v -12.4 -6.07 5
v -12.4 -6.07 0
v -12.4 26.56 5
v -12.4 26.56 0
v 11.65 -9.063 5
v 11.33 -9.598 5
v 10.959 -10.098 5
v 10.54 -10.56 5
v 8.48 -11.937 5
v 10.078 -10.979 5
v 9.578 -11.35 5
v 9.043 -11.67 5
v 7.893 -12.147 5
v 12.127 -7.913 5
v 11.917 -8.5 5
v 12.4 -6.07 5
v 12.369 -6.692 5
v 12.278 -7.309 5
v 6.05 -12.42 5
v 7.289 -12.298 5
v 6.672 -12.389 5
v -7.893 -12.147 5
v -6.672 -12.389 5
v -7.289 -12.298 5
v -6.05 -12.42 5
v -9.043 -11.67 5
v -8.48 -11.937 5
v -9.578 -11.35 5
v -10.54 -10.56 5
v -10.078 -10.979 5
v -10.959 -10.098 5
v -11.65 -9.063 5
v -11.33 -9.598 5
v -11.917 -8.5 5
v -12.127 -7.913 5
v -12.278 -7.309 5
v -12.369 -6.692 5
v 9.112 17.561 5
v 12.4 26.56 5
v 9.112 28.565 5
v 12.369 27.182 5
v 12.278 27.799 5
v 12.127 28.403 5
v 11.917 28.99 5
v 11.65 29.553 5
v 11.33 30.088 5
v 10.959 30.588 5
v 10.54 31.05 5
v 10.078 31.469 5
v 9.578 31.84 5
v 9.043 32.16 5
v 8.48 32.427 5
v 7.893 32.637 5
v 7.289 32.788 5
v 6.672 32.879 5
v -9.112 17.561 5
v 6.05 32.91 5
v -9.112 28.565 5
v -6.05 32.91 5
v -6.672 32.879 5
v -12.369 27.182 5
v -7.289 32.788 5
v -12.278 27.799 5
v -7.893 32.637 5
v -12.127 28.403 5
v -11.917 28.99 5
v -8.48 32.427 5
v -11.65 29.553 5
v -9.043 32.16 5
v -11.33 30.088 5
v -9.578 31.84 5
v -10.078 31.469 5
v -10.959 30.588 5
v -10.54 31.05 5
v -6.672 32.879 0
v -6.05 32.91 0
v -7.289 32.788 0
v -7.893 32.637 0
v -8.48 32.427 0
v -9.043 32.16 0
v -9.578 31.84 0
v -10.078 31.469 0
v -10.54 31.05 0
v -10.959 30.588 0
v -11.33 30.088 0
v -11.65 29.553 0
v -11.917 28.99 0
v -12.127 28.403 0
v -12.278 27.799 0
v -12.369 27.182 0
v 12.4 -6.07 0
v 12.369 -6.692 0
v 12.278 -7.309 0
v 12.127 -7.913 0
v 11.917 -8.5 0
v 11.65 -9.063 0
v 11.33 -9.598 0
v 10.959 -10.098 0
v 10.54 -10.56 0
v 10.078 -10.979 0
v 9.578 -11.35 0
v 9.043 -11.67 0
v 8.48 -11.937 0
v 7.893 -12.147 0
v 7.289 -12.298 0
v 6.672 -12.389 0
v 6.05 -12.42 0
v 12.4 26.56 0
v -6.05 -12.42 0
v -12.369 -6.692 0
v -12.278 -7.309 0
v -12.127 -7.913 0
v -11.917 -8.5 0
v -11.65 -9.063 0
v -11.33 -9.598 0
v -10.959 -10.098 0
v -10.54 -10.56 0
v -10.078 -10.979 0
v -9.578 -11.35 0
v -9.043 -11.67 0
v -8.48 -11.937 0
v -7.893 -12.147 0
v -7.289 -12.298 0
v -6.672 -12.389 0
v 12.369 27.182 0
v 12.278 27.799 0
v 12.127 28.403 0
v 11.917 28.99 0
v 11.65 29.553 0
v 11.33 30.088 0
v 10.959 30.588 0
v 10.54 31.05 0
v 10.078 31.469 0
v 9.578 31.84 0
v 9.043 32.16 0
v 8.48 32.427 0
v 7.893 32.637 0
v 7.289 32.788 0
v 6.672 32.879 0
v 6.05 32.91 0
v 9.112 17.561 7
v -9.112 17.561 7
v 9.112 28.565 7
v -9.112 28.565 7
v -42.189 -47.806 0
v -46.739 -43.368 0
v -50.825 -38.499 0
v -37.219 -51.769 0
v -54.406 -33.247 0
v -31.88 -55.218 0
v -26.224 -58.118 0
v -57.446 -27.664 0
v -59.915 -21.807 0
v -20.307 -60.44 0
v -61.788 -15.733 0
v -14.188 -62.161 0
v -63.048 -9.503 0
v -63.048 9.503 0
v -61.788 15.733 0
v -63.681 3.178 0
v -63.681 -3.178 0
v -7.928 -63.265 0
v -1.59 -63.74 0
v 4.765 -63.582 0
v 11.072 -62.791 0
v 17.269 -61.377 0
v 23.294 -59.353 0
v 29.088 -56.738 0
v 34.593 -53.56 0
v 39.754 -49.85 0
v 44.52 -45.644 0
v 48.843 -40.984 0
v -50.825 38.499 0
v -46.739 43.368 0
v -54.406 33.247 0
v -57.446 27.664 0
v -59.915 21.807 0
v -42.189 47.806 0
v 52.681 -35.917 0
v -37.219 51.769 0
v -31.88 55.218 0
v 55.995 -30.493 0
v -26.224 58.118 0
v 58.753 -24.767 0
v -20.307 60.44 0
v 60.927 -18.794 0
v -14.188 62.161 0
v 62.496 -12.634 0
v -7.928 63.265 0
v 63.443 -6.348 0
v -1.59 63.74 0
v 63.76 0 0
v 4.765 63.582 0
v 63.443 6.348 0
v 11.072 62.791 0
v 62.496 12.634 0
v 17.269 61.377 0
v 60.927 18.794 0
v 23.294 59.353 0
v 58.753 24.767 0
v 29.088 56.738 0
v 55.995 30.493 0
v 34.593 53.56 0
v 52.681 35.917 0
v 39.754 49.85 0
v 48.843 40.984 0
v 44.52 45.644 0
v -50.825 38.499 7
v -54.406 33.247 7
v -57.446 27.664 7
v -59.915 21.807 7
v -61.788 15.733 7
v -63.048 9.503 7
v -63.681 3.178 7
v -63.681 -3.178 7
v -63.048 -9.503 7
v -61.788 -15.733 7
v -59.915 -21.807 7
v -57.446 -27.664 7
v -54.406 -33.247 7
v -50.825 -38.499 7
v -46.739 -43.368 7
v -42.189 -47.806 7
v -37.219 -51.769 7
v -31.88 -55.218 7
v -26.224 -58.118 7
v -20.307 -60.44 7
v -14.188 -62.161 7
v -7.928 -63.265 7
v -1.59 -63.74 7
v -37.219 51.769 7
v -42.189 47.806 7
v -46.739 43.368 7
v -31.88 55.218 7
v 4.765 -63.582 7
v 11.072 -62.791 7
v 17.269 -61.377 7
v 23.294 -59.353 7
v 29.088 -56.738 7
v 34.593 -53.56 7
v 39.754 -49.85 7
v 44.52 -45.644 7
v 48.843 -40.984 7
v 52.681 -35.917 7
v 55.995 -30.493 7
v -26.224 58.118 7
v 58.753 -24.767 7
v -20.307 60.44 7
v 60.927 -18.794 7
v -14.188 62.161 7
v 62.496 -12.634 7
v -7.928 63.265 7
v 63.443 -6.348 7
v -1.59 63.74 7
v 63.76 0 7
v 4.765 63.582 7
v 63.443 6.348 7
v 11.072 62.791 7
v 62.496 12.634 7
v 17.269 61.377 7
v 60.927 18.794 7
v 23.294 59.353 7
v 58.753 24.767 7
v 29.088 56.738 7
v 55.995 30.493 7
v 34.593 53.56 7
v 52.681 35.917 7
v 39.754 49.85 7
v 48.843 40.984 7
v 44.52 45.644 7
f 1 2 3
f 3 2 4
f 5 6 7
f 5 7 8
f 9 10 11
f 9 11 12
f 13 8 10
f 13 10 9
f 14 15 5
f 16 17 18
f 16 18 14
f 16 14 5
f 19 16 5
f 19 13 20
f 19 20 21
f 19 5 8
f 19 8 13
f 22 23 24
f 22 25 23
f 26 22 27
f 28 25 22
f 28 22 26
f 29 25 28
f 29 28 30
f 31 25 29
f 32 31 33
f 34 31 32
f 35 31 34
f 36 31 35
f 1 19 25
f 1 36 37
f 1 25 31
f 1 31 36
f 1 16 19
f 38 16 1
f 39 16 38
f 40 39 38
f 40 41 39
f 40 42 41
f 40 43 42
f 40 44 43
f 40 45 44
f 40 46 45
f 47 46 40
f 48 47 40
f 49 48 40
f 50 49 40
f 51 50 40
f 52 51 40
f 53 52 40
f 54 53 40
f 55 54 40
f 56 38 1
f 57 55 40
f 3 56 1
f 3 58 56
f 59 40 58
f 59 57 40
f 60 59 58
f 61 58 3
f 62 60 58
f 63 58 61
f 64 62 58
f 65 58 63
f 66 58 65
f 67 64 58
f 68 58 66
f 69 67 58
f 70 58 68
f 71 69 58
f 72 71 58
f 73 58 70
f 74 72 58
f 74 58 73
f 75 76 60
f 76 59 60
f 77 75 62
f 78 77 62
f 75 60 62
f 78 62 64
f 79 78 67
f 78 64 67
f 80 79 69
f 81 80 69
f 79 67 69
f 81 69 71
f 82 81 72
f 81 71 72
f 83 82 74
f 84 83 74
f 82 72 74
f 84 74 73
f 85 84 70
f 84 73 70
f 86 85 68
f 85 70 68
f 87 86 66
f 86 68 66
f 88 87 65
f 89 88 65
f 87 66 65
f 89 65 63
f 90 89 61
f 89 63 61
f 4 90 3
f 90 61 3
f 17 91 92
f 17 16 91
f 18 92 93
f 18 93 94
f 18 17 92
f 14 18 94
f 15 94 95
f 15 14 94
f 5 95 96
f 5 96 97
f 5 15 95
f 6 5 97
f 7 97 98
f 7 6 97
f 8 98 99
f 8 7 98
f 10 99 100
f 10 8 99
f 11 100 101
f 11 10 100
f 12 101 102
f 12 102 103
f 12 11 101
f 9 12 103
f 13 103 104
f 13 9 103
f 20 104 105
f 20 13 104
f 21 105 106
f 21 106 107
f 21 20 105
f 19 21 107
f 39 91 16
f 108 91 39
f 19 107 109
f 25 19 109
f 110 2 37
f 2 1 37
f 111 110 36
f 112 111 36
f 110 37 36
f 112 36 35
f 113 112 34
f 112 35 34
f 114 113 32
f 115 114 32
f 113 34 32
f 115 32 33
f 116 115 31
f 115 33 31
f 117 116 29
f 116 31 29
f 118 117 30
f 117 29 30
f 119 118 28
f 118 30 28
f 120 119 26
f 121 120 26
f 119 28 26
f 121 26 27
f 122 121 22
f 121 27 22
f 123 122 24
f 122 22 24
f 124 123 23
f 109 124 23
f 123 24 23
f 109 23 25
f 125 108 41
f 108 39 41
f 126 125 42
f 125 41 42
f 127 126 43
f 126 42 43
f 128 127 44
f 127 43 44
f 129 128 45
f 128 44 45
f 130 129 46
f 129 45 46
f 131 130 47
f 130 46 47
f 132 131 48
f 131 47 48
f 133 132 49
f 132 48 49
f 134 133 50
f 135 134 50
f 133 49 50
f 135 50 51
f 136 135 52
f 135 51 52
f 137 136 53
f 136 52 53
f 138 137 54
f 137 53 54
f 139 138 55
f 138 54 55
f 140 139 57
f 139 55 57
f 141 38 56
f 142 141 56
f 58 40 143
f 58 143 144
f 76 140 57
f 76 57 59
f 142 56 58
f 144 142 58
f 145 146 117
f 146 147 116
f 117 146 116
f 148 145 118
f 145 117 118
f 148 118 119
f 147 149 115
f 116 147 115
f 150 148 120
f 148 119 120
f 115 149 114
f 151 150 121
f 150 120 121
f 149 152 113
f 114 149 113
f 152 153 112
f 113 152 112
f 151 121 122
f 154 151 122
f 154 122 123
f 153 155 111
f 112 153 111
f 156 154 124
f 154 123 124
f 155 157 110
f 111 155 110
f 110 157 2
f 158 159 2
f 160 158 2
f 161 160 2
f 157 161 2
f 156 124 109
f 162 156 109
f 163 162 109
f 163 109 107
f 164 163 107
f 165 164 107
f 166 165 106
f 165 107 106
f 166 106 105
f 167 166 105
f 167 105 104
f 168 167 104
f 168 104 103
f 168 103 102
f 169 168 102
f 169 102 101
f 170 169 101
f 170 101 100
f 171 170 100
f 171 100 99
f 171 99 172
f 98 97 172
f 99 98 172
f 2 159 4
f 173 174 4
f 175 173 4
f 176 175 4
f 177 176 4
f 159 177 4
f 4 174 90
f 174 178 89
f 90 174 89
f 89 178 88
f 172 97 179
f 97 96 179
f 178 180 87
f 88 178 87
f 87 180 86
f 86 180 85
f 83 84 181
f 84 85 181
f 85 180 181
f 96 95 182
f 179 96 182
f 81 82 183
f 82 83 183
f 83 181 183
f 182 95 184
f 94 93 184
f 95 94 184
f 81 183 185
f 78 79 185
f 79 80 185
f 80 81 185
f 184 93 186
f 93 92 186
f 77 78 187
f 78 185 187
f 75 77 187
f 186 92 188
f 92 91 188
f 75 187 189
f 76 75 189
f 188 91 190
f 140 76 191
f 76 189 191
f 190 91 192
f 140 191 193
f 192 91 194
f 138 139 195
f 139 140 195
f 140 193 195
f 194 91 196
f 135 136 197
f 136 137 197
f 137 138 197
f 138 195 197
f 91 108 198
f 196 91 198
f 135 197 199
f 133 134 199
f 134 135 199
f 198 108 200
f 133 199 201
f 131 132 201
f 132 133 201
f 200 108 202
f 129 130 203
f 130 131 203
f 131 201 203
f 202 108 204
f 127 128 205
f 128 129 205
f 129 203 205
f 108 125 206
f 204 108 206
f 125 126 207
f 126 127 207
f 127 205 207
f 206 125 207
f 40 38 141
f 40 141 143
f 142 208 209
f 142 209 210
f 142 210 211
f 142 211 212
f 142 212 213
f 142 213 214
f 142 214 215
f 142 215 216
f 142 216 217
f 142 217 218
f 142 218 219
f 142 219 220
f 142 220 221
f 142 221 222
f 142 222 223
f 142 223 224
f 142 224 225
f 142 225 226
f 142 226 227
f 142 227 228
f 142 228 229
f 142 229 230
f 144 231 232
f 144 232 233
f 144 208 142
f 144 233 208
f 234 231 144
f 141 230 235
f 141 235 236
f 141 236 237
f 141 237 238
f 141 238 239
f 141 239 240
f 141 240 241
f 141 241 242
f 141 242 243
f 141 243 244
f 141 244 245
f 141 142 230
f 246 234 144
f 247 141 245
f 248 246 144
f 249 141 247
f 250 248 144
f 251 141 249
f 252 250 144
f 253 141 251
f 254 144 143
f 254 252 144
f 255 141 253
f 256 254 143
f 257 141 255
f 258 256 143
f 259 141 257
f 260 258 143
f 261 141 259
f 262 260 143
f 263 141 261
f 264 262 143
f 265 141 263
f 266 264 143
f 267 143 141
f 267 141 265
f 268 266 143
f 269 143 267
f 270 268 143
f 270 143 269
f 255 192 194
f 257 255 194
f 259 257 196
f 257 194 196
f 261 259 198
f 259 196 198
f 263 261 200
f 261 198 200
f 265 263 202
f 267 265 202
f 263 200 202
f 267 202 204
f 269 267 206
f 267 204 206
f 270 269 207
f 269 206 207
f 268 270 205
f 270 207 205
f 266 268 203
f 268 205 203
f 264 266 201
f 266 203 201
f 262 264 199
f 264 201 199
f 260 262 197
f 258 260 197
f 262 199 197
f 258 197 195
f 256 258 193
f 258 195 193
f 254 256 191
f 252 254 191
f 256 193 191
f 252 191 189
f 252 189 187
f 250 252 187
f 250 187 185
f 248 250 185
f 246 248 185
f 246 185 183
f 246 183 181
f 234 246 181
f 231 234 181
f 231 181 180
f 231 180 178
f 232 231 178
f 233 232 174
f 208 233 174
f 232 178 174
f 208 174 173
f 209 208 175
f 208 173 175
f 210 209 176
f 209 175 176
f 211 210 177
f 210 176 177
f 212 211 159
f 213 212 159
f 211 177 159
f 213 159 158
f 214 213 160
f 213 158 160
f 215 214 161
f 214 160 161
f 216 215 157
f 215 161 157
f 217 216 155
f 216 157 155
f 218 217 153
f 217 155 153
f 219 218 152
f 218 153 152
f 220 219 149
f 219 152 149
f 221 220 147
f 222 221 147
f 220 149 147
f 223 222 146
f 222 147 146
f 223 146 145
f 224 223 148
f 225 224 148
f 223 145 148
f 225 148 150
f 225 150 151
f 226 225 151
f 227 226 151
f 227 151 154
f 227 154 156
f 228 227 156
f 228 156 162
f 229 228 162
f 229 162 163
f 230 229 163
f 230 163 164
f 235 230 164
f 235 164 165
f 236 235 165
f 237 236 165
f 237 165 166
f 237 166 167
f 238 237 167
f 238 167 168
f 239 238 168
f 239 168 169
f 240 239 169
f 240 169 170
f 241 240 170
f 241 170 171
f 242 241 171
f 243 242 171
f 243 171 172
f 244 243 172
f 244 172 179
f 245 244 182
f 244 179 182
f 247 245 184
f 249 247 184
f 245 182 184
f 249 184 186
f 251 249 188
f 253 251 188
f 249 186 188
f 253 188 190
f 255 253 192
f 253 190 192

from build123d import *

# Parameters (mm, degrees)
SKETCH1_R           = 63.76
BOSS_EXTRUDE1_DEPTH = 7
SKETCH4_W           = 24.8
SKETCH4_H           = 45.33
CUT_EXTRUDE1_DEPTH  = 5
FILLET1_R           = 6.35
CUT_EXTRUDE2_REACH  = 92.309
SKETCH5_W           = 18.224025504
SKETCH5_H           = 11.004820717


with BuildPart() as part:
    # Sketch1 → Boss-Extrude1 (new body)
    with BuildSketch(Plane.XY):
        Circle(SKETCH1_R)
    extrude(amount=BOSS_EXTRUDE1_DEPTH)

    # Sketch4 → Cut-Extrude1 (cut)
    with BuildSketch(Plane(origin=(0, 0, 0), x_dir=(-1, 0, 0), z_dir=(0, 0, -1))):
        with Locations((0, 10.245)):
            Rectangle(SKETCH4_W, SKETCH4_H)
    extrude(amount=-CUT_EXTRUDE1_DEPTH, mode=Mode.SUBTRACT)

    # Fillet1
    fillet1_edges = [part.edges().sort_by_distance(p)[0] for p in [
        (12.4, -12.42, 2.5),
        (12.4, 32.91, 2.5),
        (-12.4, 32.91, 2.5),
        (-12.4, -12.42, 2.5),
    ]]
    fillet(fillet1_edges, radius=FILLET1_R)

    # Sketch5 → Cut-Extrude2 (cut, up to next)
    with BuildSketch(Plane(origin=(0, 0, 5), x_dir=(-1, 0, 0), z_dir=(0, 0, -1)), mode=Mode.PRIVATE) as cut_extrude2_sk1:
        with Locations((0, 23.06297221)):
            Rectangle(SKETCH5_W, SKETCH5_H)
    cut_extrude2_tool1 = extrude(cut_extrude2_sk1.sketch, amount=-CUT_EXTRUDE2_REACH, mode=Mode.PRIVATE) & part.part
    add(cut_extrude2_tool1.solids().sort_by_distance((0, 23.062972, 5))[0], mode=Mode.SUBTRACT)


solid = part.part
